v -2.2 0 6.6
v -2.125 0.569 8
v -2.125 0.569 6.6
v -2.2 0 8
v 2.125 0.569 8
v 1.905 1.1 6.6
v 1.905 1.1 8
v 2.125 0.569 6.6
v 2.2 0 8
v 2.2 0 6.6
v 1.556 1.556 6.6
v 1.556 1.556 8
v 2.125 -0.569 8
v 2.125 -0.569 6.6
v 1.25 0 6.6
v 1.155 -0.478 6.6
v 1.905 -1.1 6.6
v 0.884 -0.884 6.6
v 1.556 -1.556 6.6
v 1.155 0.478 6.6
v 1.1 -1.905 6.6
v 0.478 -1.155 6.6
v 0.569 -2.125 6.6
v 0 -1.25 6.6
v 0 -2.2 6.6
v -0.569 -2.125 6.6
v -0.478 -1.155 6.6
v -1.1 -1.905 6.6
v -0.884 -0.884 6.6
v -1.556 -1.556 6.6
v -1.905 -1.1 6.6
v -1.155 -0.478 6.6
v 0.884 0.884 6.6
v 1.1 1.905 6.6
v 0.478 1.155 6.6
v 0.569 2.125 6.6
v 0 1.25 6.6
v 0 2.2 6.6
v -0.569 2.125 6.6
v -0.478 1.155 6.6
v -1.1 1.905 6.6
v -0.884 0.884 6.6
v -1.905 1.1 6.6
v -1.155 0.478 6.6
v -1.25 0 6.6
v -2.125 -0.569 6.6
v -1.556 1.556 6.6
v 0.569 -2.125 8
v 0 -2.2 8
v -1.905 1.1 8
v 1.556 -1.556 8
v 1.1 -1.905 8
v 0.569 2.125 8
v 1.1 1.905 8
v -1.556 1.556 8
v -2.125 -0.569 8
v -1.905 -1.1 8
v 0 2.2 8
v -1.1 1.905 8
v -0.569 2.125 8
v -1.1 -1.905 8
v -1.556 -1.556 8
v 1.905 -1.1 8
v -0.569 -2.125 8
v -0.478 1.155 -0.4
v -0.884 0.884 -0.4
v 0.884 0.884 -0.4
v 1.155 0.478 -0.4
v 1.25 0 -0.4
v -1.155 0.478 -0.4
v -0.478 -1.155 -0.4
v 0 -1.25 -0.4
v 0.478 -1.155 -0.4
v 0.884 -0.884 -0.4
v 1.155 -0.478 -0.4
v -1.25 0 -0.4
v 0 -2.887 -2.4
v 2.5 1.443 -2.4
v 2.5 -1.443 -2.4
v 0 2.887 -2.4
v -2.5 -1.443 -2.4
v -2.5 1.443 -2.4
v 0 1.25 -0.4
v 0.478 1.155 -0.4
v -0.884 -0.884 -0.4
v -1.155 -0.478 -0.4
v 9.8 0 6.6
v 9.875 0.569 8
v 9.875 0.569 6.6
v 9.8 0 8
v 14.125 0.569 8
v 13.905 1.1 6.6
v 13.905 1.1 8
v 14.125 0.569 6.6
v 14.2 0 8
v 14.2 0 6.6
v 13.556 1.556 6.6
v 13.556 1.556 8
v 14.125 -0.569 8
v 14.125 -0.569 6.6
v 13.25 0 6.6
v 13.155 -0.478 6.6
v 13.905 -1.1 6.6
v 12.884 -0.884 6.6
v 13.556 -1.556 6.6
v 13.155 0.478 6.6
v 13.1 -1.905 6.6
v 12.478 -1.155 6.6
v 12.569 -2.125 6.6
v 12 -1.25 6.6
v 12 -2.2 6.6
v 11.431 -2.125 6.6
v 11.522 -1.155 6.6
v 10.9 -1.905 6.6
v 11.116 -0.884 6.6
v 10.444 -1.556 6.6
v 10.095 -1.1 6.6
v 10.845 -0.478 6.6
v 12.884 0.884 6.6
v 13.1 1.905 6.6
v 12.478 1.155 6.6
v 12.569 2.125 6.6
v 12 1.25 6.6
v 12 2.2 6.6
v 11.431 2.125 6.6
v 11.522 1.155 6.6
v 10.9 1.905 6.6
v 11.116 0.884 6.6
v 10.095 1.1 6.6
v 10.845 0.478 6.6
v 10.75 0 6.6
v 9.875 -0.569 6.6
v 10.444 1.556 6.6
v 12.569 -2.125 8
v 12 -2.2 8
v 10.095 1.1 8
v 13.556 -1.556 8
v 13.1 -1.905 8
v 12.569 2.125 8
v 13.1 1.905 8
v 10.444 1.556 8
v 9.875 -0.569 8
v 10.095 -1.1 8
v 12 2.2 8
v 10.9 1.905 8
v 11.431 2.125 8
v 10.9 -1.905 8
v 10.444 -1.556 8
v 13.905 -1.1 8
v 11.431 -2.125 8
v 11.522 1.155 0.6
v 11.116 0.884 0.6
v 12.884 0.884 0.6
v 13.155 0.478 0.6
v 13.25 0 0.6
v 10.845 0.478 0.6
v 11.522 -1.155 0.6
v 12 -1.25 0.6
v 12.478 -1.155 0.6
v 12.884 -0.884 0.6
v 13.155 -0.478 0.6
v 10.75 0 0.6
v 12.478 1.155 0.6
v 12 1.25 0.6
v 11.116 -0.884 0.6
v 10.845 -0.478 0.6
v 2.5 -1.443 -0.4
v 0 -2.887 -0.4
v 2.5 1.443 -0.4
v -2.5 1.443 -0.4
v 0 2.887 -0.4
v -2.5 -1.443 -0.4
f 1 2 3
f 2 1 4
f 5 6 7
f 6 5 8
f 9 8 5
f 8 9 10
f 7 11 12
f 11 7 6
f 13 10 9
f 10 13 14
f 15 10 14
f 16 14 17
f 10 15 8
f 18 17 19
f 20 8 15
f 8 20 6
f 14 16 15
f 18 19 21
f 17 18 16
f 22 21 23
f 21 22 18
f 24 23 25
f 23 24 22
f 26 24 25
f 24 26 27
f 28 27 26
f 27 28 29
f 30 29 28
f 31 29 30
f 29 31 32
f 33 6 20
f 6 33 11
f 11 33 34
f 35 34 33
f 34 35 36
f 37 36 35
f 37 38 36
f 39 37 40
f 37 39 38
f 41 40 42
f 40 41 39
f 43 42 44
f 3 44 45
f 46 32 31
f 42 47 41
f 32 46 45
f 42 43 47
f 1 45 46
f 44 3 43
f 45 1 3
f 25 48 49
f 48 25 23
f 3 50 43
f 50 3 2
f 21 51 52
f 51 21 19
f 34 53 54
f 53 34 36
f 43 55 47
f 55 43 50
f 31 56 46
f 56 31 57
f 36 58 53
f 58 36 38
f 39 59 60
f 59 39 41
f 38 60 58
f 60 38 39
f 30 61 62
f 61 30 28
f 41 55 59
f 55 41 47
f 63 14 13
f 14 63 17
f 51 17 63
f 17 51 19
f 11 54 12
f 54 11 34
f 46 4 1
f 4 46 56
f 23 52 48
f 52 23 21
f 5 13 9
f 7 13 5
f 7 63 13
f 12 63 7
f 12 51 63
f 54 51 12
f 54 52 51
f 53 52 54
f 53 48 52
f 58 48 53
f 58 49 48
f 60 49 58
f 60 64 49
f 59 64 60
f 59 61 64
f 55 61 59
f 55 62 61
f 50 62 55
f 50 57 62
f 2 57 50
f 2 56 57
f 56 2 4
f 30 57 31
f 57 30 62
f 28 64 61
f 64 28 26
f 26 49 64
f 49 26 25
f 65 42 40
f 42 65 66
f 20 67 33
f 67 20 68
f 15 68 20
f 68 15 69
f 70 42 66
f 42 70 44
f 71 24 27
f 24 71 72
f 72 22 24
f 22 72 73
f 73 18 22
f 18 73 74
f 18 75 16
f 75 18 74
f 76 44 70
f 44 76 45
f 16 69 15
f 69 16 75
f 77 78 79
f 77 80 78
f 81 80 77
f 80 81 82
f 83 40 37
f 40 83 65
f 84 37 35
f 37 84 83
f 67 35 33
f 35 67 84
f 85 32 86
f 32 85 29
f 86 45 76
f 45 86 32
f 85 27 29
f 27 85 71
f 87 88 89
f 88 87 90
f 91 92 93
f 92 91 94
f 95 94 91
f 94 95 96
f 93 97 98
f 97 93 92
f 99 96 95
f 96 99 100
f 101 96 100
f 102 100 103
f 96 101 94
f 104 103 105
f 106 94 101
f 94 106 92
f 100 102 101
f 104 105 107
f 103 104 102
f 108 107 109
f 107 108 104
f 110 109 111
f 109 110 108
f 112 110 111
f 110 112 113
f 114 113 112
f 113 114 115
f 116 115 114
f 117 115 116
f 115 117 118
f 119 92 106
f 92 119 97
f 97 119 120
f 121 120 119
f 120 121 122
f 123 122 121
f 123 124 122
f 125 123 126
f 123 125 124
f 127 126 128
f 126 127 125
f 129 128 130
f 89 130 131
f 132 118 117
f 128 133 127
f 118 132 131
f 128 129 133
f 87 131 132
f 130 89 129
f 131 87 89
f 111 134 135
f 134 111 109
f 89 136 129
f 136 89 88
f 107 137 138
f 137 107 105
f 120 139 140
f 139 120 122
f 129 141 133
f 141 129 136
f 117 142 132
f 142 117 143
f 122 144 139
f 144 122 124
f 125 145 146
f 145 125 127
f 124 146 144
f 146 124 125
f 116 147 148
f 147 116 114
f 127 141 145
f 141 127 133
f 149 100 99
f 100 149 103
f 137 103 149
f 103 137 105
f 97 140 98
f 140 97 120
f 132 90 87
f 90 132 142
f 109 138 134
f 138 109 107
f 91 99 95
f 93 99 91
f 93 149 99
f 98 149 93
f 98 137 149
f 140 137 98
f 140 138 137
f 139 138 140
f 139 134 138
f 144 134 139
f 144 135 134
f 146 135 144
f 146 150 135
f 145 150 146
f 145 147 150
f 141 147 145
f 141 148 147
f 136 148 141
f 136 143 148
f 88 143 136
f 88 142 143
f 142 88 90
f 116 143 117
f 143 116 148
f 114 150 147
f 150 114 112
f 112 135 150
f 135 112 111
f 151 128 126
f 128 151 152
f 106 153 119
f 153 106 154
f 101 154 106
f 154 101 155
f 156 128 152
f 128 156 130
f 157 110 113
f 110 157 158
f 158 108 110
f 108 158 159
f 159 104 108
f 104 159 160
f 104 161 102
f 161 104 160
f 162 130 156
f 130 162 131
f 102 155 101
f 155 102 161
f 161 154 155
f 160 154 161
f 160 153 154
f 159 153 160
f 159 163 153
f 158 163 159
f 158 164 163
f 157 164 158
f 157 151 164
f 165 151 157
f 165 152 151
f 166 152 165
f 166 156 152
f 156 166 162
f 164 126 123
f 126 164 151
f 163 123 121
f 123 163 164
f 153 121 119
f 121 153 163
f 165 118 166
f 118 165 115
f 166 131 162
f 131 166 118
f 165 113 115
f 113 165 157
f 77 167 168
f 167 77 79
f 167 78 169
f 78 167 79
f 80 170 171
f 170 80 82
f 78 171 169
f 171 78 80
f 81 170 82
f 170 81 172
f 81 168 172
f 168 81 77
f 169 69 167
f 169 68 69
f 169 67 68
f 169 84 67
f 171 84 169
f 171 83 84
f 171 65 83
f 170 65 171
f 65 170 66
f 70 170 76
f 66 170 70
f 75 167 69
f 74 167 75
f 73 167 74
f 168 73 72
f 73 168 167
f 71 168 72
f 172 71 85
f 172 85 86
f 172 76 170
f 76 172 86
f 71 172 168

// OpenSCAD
// file: ../screw-post.scad
//-----------------------------------------------------------------------
// Screw post: a round post off the floor that a board screws down onto
//
// Two ways to fix:
//   "nut"  clearance hole through the post and floor; the nut sits in a hex
//          trap in the floor's underside, so the screw goes in from the top
//   "tap"  a pilot hole the screw cuts its own thread in (one or two fittings
//          in PLA/PETG); blind, the floor stays whole underneath
// and "head" for a screw up from below (head in a counterbore, nut on top).
//
// Modules, all in the same frame:
//   screwPostGhost()     the screw (and nut), for previews
//   screwPost()          the post: add to the floor
//   screwPostFloorCut()  subtract from the floor: nut trap / counterbore and hole
//
// Frame: origin on the floor top, on the post's axis. Z up; the floor is
// Z = -floorThick .. 0. Units: mm.
//
// Sizes: "M2", "M2.5", "M3". screwPostScrew(size, ...) says which screw length
// reaches, so a project can assert it has that screw in the kit.
//-----------------------------------------------------------------------

//-- [name, screw Ø, nut across flats, nut thick, head Ø, head height, tap hole, post Ø]
//-- Nuts ISO 4032; heads ISO 7380 button. Tap holes: the usual ~0.8 x Ø for plastic
screwSizes = [
  ["M2",   2.0, 4.0, 1.6, 3.5, 1.1, 1.6, 5.0],
  ["M2.5", 2.5, 5.0, 2.0, 4.4, 1.4, 2.1, 6.0],    // head 4.4: measured on the kit's M2.5 (controller base)
  ["M3",   3.0, 5.5, 2.4, 5.7, 1.65, 2.5, 7.0],
];

screwHoleClear = 0.4;     // added to the screw Ø for a clearance hole
screwNutClear  = 0.3;     // CAL: across flats, nut trap over the nut. Set by the fit piece
screwTapClear  = 0.0;     // CAL: added to the tap hole. Set by the fit piece
screwHeadClear = 0.6;     // counterbore over the head Ø

function screwSize(size) = let (i = search([size], screwSizes)[0])
  assert(i != [] && i != undef, str("unknown screw size ", size)) screwSizes[i];
function screwDia(size)    = screwSize(size)[1];
function screwNutAF(size)  = screwSize(size)[2];
function screwNutH(size)   = screwSize(size)[3];
function screwHeadDia(size)= screwSize(size)[4];
function screwHeadH(size)  = screwSize(size)[5];
function screwPostDia(size)= screwSize(size)[7];

//-- Shortest screw that fills the nut, from the top of the clamped part (h + clamp
//-- above the floor) down to the nut trap's underside. Round up to a length you have.
function screwPostScrew(size, h, floorThick, clamp = 1.6) = h + clamp + floorThick;

module screwPostGhost(size, h, floorThick, clamp = 1.6, length, how = "nut")
{
  d = screwDia(size);
  L = is_undef(length) ? screwPostScrew(size, h, floorThick, clamp) : length;
  top = h + clamp;
  if (how == "head")
  {
    %color("Silver") translate([0, 0, -floorThick]) cylinder(d = screwHeadDia(size), h = screwHeadH(size), $fn = 24);
    %color("Silver") translate([0, 0, -floorThick + screwHeadH(size)]) cylinder(d = d, h = L, $fn = 16);
  }
  else
  {
    %color("Silver") translate([0, 0, top]) cylinder(d = screwHeadDia(size), h = screwHeadH(size), $fn = 24);
    %color("Silver") translate([0, 0, top - L]) cylinder(d = d, h = L, $fn = 16);
    if (how == "nut")
      %color("DimGray") translate([0, 0, -floorThick]) rotate([0, 0, 30]) cylinder(d = screwNutAF(size)/cos(30), h = screwNutH(size), $fn = 6);
  }
}

//-- how: "nut" | "head" (through hole) or "tap" (blind pilot hole). postDia defaults by size
module screwPost(size, h, how = "nut", postDia, tapClear = screwTapClear)
{
  pd = is_undef(postDia) ? screwPostDia(size) : postDia;
  hole = how == "tap" ? screwSize(size)[6] + tapClear : screwDia(size) + screwHoleClear;
  difference()
  {
    translate([0, 0, -0.01]) cylinder(d = pd, h = h + 0.01, $fn = 40);
    translate([0, 0, how == "tap" ? 0.6 : -1]) cylinder(d = hole, h = h + 2, $fn = 24);
    //-- lead-in so the screw starts square
    translate([0, 0, h - 0.4]) cylinder(d1 = hole, d2 = hole + 0.8, h = 0.41, $fn = 24);
  }
}

//-- "nut": hex trap from the underside, opening a little over the nut so it sits flush.
//-- "head": counterbore for the head. "tap": nothing.
module screwPostFloorCut(size, floorThick, how = "nut", nutClear = screwNutClear)
{
  d = screwDia(size) + screwHoleClear;
  if (how == "nut")
  {
    af = screwNutAF(size) + nutClear;
    translate([0, 0, -floorThick - 1]) rotate([0, 0, 30]) cylinder(d = af/cos(30), h = screwNutH(size) + 0.1 + 1, $fn = 6);
    translate([0, 0, -floorThick - 1]) cylinder(d = d + 0.4, h = floorThick + 2, $fn = 24);
  }
  if (how == "head")
  {
    translate([0, 0, -floorThick - 1]) cylinder(d = screwHeadDia(size) + screwHeadClear, h = screwHeadH(size) + 0.2 + 1, $fn = 32);
    translate([0, 0, -floorThick - 1]) cylinder(d = d + 0.4, h = floorThick + 2, $fn = 24);
  }
  assert(how == "tap" || floorThick >= (how == "nut" ? screwNutH(size) : screwHeadH(size)) + 0.1 + 0.3,
         str("floor too thin for the ", size, " ", how));
}
// main file
// The screw, nut and a board between them, as solids for the catalogue.
use <../screw-post.scad>

size       = "M2.5";
h          = 5;
floorThick = 2.4;
clamp      = 1.6;
d = screwDia(size);
L = screwPostScrew(size, h, floorThick, clamp);
for (x = [0, 12])
  translate([x, 0, 0])
  {
    translate([0, 0, h + clamp]) cylinder(d = screwHeadDia(size), h = screwHeadH(size), $fn = 24);
    translate([0, 0, h + clamp - (x == 0 ? L : h + clamp - 0.6)]) cylinder(d = d, h = x == 0 ? L : h + clamp - 0.6, $fn = 16);
  }
translate([0, 0, -floorThick]) rotate([0, 0, 30]) cylinder(d = screwNutAF(size)/cos(30), h = screwNutH(size), $fn = 6);
